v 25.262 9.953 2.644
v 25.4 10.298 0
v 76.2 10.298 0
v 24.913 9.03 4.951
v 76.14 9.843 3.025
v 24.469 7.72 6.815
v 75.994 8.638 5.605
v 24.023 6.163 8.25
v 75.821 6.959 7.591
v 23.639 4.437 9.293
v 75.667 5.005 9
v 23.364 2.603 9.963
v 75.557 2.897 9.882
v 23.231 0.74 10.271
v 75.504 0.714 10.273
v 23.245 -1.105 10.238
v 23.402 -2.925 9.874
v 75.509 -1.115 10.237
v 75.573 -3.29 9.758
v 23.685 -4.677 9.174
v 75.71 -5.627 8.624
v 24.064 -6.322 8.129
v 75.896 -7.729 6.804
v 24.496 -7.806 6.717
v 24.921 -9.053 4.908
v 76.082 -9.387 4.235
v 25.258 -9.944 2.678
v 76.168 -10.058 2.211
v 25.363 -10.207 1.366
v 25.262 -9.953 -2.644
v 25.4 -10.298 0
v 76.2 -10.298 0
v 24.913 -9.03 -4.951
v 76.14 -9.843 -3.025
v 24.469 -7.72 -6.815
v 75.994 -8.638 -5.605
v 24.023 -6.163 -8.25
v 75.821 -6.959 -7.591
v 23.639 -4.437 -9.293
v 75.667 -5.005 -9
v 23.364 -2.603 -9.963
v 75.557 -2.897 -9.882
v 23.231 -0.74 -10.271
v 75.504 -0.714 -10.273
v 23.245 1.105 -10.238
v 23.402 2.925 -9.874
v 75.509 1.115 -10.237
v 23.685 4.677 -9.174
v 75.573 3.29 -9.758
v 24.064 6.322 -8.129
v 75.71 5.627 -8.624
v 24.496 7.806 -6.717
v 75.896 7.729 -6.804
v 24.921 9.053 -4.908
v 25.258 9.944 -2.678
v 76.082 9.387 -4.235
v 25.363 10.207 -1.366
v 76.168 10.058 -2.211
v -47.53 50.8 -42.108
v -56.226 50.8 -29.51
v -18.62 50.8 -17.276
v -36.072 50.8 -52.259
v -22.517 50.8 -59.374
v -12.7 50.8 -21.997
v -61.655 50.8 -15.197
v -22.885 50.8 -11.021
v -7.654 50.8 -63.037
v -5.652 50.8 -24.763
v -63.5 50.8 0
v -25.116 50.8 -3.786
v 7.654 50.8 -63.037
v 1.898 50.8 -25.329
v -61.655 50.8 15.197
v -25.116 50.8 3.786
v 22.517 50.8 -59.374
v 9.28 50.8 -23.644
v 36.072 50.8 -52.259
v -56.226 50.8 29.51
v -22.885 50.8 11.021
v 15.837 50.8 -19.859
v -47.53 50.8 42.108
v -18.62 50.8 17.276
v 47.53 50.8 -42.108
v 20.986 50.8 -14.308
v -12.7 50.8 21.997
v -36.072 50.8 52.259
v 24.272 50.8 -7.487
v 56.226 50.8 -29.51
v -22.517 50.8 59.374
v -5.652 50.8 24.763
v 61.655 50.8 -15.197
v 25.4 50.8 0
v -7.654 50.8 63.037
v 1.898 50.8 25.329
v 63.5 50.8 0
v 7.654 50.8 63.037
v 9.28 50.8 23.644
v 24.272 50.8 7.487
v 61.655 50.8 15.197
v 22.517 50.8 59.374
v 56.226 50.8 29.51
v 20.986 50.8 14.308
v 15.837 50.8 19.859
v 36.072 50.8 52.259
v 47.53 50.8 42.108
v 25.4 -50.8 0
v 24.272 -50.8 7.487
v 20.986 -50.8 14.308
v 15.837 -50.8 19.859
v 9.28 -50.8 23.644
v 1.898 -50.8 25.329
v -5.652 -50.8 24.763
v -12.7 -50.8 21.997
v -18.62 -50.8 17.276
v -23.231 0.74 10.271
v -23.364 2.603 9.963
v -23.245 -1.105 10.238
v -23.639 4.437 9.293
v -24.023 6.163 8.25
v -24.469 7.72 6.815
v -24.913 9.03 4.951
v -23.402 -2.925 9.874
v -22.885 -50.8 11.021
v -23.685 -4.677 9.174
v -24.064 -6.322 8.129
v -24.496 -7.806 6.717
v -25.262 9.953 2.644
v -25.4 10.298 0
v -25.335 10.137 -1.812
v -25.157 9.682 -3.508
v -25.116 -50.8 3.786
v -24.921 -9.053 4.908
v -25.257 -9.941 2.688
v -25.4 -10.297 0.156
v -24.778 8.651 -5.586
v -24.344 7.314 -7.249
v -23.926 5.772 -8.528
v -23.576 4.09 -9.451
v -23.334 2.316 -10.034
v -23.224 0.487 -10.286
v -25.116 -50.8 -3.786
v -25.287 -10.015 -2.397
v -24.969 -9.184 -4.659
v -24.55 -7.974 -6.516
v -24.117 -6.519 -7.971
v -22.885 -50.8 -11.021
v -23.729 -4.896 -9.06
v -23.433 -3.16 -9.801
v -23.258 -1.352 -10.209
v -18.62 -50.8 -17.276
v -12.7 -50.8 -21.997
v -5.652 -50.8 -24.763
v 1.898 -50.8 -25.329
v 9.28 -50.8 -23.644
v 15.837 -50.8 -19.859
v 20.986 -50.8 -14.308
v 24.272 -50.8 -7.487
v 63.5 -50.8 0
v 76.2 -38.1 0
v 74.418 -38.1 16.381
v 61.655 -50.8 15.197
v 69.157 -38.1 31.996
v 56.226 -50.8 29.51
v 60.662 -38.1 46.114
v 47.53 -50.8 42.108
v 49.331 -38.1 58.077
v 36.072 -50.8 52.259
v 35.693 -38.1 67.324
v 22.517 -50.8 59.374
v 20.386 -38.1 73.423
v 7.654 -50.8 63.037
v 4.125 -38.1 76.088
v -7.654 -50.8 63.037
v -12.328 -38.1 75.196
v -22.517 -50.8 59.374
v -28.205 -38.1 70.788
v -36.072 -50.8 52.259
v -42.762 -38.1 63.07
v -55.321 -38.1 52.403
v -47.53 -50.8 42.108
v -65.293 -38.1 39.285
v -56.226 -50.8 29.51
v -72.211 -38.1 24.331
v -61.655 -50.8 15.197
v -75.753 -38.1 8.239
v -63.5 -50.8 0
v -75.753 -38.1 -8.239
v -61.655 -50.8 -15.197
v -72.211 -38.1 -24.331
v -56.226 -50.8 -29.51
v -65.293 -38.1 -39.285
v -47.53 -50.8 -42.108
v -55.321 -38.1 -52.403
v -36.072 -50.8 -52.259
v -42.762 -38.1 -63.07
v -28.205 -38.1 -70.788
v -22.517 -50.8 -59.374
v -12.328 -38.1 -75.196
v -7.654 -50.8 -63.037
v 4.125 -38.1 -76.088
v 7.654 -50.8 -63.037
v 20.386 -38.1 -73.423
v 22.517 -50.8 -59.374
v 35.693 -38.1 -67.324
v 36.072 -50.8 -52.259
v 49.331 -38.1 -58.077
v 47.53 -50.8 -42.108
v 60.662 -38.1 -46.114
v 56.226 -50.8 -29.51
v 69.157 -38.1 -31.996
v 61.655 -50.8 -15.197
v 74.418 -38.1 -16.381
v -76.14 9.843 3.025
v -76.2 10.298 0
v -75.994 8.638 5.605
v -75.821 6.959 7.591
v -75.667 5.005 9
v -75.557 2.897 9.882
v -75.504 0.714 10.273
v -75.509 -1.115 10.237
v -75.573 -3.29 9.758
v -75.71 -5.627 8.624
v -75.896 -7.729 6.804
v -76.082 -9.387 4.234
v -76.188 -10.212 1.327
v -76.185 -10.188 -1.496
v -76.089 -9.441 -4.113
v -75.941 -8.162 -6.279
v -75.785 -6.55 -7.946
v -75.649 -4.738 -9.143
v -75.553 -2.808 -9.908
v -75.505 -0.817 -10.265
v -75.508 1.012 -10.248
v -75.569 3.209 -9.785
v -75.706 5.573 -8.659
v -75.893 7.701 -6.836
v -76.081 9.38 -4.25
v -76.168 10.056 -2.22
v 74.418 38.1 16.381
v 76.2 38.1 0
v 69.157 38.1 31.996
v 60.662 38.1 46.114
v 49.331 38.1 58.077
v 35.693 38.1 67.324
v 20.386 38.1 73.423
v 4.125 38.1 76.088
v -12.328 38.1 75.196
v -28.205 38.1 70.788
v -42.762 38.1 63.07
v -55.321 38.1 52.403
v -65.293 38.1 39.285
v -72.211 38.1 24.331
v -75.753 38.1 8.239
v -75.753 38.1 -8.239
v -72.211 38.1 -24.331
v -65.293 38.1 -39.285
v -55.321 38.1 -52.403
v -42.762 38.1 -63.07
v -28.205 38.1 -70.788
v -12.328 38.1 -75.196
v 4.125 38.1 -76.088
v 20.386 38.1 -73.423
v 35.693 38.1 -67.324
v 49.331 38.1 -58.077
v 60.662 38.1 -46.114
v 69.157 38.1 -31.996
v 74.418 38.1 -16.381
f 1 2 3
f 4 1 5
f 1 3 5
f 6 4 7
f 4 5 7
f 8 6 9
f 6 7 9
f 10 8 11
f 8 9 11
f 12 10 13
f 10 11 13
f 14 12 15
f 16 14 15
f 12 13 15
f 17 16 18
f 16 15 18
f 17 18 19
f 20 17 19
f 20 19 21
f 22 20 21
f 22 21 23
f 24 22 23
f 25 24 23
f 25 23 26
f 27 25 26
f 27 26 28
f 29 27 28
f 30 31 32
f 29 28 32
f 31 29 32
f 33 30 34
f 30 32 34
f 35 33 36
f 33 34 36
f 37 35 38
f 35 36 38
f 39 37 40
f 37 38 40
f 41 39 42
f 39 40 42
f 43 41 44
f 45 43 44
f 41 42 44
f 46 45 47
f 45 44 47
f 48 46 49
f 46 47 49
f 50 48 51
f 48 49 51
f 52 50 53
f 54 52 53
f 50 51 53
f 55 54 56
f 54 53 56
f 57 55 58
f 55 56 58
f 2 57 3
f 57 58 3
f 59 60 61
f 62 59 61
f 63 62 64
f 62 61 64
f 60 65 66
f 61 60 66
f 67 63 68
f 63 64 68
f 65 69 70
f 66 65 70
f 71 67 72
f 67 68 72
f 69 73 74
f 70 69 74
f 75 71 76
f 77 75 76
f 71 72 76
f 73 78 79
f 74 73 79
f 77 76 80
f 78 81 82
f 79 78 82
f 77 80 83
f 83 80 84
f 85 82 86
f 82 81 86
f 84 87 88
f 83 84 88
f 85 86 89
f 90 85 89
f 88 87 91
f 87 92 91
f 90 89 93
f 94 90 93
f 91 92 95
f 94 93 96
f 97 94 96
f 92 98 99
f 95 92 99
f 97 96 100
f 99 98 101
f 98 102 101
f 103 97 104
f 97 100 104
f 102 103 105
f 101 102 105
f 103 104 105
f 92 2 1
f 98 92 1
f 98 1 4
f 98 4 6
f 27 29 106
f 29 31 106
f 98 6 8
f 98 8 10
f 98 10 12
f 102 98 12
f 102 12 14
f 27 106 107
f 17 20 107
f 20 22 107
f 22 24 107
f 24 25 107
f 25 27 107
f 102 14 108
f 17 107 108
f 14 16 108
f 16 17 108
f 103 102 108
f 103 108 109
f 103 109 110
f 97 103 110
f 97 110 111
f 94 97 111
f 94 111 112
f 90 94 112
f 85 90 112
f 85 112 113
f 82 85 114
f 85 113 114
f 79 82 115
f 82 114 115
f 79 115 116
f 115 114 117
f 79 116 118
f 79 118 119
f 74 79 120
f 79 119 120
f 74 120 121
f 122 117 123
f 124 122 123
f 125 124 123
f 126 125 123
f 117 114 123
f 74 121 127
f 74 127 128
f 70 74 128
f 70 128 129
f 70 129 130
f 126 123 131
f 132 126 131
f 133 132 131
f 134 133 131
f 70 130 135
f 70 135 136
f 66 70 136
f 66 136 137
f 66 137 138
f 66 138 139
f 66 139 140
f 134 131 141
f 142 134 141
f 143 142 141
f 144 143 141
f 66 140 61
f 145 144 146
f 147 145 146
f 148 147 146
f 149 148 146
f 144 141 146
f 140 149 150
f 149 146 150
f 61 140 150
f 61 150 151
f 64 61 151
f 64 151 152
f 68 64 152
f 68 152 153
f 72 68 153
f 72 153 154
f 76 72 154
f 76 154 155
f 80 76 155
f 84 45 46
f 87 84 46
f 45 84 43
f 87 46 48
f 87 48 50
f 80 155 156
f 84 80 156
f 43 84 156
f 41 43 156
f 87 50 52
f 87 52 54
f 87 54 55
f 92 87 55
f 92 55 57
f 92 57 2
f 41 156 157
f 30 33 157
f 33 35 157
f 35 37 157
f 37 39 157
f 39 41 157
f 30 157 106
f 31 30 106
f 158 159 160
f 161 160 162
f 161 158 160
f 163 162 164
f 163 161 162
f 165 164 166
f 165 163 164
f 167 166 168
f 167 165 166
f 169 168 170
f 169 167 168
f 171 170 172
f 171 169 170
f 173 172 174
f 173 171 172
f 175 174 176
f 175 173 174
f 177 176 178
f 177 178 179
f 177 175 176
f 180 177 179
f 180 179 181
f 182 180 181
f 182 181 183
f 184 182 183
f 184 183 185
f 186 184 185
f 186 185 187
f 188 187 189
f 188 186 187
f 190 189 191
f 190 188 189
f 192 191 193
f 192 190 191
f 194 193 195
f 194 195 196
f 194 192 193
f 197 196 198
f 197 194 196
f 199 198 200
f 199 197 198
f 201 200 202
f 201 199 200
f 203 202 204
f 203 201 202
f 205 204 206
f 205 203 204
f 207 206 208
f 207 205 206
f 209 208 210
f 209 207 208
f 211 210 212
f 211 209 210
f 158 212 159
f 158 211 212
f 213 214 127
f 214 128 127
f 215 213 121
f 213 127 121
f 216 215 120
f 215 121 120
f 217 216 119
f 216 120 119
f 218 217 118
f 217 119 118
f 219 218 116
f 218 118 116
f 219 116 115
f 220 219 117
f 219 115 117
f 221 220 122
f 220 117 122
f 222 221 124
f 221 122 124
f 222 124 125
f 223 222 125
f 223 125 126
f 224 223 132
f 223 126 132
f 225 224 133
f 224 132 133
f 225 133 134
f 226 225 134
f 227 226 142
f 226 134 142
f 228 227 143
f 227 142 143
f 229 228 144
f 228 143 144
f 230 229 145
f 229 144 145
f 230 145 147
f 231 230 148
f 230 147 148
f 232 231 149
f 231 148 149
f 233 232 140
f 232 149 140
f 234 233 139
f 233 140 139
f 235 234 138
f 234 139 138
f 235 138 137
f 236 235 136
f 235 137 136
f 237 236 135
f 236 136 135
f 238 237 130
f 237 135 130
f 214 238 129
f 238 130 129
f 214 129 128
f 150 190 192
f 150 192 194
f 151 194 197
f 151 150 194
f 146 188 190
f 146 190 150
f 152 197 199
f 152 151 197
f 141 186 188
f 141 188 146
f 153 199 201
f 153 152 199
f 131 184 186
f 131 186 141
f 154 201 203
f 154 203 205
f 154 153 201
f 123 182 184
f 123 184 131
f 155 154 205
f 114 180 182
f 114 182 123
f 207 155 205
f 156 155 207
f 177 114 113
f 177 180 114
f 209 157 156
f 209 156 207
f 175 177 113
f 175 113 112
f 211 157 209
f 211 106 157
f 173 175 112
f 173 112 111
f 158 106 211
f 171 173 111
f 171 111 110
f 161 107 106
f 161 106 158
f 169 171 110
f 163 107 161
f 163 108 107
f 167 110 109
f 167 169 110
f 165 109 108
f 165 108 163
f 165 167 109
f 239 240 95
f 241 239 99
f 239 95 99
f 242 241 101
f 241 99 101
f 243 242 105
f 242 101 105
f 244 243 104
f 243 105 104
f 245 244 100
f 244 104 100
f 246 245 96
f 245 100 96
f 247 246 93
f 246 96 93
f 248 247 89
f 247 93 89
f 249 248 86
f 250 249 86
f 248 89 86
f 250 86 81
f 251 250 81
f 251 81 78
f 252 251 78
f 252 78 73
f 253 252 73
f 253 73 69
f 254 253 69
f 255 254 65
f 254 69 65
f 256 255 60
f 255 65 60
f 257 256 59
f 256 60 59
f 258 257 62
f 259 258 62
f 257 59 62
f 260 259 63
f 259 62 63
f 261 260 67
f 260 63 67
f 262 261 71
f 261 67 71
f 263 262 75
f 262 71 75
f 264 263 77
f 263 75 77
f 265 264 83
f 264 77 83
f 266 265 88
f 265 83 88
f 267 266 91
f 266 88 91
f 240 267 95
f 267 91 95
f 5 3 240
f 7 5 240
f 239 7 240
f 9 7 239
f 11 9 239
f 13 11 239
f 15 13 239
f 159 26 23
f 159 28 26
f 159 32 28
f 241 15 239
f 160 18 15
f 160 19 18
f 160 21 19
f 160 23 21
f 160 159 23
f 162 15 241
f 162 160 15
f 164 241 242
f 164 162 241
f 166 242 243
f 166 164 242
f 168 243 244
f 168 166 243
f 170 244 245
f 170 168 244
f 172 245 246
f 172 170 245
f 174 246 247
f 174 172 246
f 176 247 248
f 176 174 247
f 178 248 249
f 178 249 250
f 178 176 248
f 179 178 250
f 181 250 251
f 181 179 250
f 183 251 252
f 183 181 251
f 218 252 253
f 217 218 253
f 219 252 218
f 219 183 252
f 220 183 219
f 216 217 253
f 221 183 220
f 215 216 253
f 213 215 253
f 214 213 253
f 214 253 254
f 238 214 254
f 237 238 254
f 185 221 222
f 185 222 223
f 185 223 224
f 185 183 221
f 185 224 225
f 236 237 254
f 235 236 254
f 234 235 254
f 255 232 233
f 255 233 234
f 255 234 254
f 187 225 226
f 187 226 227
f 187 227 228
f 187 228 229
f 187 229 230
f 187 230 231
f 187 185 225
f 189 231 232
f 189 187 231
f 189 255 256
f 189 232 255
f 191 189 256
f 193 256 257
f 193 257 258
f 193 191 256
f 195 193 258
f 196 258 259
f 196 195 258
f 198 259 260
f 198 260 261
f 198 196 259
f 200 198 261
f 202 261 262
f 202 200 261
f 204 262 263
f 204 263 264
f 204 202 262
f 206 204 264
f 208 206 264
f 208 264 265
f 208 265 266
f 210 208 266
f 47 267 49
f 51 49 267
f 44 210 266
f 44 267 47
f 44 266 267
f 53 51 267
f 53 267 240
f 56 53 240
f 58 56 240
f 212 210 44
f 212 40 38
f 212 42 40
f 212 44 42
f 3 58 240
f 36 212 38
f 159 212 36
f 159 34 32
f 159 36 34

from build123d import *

# Parameters (mm, degrees)
F0_R          = 76.2
F1_DEPTH      = 50.8
F1_DEPTH_BACK = 50.8
F2_R          = 25.4
F3_DEPTH      = 101.601
F4_SIZE       = 12.7
F5_R          = 10.297763
F6_DEPTH      = 152.4


with BuildPart() as f1:
    # F0 (on Front) → F1 (new body, two sides)
    with BuildSketch(Plane.XZ) as f1_sk:
        Circle(F0_R)
    extrude(amount=F1_DEPTH)
    extrude(f1_sk.sketch, amount=-F1_DEPTH_BACK)

    # F2 (on face) → F3 (cut, through all)
    with BuildSketch(Plane.XZ.offset(50.8)):
        Circle(F2_R)
    extrude(amount=-F3_DEPTH, mode=Mode.SUBTRACT)

    # F4
    f4_edges = [f1.edges().sort_by_distance(p)[0] for p in [
        (-76.2, -50.8, 0),
        (-76.2, 50.8, 0),
    ]]
    chamfer(f4_edges, length=F4_SIZE)

    # F5 (on Right) → F6 (cut, symmetric)
    with BuildSketch(Plane.YZ):
        Circle(F5_R)
    extrude(amount=F6_DEPTH, both=True, mode=Mode.SUBTRACT)


solid = f1.part
